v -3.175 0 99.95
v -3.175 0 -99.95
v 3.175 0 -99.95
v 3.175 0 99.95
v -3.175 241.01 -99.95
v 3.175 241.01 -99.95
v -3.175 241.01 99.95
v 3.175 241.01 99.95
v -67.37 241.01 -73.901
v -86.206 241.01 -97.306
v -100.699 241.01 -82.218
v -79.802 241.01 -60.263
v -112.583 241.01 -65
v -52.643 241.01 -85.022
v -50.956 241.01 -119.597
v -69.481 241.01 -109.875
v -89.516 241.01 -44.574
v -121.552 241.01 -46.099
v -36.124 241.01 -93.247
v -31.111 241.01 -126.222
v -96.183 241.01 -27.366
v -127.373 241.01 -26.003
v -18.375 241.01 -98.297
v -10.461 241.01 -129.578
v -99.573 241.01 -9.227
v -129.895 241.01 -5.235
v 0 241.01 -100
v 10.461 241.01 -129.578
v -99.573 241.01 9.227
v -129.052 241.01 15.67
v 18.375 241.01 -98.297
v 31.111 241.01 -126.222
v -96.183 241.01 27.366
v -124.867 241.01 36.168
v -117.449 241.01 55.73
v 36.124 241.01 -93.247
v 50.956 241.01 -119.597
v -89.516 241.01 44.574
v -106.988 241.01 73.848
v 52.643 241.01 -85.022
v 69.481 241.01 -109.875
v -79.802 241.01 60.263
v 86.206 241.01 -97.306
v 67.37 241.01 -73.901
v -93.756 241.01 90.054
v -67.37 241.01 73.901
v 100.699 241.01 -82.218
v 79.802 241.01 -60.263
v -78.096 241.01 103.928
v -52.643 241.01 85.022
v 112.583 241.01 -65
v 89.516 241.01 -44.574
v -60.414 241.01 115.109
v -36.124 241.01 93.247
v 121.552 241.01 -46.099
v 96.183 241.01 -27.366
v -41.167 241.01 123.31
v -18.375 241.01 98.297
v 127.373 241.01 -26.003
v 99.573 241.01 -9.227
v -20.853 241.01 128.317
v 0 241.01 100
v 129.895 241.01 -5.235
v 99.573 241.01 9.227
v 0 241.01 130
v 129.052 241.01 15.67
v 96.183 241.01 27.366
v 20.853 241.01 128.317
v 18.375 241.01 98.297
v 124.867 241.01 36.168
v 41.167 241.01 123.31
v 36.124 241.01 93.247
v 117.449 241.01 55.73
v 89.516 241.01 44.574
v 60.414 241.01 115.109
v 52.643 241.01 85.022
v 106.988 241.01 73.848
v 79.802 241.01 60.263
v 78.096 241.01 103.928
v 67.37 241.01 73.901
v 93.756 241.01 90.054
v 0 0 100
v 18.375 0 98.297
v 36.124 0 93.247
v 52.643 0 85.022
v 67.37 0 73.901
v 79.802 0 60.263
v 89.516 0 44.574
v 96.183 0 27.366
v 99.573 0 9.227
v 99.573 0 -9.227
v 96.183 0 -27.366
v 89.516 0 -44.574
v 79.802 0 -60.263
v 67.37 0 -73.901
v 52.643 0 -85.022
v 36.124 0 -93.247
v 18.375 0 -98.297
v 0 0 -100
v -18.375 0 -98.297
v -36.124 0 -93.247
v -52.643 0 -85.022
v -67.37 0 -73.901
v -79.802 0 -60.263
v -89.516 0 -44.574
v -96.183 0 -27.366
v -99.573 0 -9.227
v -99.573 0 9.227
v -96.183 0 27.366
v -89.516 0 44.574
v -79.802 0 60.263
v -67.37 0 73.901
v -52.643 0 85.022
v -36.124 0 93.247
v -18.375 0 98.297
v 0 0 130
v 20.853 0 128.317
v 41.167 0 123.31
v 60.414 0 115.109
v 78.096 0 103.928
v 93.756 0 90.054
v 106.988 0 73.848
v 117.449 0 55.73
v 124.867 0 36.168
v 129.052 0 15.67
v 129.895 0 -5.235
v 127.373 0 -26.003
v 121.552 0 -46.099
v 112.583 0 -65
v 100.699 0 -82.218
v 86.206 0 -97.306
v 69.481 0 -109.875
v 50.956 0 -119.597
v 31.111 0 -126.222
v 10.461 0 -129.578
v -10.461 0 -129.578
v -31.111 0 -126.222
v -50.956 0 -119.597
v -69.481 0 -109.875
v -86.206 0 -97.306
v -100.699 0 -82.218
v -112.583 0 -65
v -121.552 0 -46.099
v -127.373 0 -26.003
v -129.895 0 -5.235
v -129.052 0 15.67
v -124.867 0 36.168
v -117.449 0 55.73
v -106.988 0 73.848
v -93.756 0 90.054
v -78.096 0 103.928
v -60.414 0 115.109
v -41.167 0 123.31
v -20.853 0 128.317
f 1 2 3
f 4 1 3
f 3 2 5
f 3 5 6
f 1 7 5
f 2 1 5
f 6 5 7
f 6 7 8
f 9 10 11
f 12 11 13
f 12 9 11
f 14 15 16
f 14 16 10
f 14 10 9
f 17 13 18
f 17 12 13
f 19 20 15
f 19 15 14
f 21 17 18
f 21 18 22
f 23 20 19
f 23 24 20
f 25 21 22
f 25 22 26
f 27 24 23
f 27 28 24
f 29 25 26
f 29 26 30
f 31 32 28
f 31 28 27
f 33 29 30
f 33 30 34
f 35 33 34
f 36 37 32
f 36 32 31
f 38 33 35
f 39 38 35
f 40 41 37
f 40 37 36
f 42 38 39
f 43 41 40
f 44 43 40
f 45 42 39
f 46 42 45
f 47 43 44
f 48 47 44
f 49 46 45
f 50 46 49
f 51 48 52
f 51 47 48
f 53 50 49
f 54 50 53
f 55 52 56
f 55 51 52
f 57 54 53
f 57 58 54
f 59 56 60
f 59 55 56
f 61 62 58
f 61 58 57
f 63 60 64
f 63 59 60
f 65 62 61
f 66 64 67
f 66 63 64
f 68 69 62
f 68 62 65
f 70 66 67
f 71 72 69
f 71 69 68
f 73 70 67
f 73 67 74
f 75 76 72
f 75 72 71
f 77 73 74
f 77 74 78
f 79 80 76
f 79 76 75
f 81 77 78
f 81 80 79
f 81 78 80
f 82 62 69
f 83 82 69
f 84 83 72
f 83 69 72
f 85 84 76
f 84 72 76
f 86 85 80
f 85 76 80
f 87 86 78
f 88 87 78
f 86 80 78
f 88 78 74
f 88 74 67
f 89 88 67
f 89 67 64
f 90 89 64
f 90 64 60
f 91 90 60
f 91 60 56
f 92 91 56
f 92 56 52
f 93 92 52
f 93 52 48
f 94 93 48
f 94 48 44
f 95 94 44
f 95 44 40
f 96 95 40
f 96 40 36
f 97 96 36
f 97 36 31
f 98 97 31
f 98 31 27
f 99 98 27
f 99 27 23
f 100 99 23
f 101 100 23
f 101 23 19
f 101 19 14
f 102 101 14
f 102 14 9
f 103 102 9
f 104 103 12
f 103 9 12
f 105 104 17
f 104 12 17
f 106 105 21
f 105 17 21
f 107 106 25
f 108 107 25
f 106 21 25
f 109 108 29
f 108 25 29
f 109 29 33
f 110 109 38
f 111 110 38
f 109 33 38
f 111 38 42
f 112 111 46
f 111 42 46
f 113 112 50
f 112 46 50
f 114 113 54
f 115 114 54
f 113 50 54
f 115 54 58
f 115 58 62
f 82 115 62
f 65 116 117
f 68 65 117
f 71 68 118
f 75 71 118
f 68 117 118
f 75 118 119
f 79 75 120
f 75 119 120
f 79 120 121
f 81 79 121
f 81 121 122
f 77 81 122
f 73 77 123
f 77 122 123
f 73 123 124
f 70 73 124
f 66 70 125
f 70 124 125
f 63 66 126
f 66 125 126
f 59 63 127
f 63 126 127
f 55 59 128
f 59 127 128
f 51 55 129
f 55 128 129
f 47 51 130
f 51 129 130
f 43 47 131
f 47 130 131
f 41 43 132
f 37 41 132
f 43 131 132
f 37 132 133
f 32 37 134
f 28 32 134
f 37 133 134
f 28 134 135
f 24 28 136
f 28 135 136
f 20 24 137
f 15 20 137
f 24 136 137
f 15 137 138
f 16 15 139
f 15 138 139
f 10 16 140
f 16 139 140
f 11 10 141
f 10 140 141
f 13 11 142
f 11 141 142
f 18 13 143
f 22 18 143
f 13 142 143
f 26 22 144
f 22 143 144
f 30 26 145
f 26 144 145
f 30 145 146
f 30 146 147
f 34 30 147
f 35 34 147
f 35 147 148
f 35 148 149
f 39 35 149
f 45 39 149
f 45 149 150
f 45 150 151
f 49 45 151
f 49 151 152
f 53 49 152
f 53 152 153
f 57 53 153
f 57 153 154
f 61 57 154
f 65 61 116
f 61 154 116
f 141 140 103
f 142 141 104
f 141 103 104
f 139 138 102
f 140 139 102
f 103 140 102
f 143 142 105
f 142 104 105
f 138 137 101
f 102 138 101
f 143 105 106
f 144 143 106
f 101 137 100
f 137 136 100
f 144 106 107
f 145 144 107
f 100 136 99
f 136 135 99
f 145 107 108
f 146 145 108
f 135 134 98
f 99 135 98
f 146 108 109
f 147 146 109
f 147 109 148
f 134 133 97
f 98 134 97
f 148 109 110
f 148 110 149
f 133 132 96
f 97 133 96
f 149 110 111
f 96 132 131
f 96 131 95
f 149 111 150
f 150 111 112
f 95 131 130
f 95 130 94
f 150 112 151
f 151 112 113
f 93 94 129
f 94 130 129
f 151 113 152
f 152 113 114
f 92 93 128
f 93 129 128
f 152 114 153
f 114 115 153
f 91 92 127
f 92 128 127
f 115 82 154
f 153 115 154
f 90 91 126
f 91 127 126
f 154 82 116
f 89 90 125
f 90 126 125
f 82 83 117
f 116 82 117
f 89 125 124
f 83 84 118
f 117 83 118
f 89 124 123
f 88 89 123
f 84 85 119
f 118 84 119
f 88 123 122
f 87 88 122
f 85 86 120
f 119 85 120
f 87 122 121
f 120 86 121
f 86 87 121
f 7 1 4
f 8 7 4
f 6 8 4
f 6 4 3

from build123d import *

# Parameters (mm, degrees)
SKETCH1_R           = 130
BOSS_EXTRUDE1_DEPTH = 241.01
SKETCH2_R           = 100
CUT_EXTRUDE1_DEPTH  = 304.126739335
SKETCH5_W           = 6.35
SKETCH5_H           = 199.899168332
BOSS_EXTRUDE2_DEPTH = 241.01


with BuildPart() as part:
    # Sketch1 → Boss-Extrude1 (new body)
    with BuildSketch(Plane(origin=(0, 0, 0), x_dir=(1, 0, 0), z_dir=(0, 1, 0))):
        with Locations(Location((0, 0, 0), (0, 0, 270))):
            Circle(SKETCH1_R)
    extrude(amount=BOSS_EXTRUDE1_DEPTH)

    # Sketch2 → Cut-Extrude1 (cut, through all)
    with BuildSketch(Plane(origin=(0, 241.01, 0), x_dir=(1, 0, 0), z_dir=(0, 1, 0))):
        with Locations(Location((0, 0, 0), (0, 0, 270))):
            Circle(SKETCH2_R)
    extrude(amount=-CUT_EXTRUDE1_DEPTH, mode=Mode.SUBTRACT)


with BuildPart() as body_2:
    # Sketch5 → Boss-Extrude2 (new body)
    with BuildSketch(Plane(origin=(0, 0, 0), x_dir=(1, 0, 0), z_dir=(0, 1, 0))):
        Rectangle(SKETCH5_W, SKETCH5_H)
    extrude(amount=BOSS_EXTRUDE2_DEPTH)


solid = Compound([part.part, body_2.part])
